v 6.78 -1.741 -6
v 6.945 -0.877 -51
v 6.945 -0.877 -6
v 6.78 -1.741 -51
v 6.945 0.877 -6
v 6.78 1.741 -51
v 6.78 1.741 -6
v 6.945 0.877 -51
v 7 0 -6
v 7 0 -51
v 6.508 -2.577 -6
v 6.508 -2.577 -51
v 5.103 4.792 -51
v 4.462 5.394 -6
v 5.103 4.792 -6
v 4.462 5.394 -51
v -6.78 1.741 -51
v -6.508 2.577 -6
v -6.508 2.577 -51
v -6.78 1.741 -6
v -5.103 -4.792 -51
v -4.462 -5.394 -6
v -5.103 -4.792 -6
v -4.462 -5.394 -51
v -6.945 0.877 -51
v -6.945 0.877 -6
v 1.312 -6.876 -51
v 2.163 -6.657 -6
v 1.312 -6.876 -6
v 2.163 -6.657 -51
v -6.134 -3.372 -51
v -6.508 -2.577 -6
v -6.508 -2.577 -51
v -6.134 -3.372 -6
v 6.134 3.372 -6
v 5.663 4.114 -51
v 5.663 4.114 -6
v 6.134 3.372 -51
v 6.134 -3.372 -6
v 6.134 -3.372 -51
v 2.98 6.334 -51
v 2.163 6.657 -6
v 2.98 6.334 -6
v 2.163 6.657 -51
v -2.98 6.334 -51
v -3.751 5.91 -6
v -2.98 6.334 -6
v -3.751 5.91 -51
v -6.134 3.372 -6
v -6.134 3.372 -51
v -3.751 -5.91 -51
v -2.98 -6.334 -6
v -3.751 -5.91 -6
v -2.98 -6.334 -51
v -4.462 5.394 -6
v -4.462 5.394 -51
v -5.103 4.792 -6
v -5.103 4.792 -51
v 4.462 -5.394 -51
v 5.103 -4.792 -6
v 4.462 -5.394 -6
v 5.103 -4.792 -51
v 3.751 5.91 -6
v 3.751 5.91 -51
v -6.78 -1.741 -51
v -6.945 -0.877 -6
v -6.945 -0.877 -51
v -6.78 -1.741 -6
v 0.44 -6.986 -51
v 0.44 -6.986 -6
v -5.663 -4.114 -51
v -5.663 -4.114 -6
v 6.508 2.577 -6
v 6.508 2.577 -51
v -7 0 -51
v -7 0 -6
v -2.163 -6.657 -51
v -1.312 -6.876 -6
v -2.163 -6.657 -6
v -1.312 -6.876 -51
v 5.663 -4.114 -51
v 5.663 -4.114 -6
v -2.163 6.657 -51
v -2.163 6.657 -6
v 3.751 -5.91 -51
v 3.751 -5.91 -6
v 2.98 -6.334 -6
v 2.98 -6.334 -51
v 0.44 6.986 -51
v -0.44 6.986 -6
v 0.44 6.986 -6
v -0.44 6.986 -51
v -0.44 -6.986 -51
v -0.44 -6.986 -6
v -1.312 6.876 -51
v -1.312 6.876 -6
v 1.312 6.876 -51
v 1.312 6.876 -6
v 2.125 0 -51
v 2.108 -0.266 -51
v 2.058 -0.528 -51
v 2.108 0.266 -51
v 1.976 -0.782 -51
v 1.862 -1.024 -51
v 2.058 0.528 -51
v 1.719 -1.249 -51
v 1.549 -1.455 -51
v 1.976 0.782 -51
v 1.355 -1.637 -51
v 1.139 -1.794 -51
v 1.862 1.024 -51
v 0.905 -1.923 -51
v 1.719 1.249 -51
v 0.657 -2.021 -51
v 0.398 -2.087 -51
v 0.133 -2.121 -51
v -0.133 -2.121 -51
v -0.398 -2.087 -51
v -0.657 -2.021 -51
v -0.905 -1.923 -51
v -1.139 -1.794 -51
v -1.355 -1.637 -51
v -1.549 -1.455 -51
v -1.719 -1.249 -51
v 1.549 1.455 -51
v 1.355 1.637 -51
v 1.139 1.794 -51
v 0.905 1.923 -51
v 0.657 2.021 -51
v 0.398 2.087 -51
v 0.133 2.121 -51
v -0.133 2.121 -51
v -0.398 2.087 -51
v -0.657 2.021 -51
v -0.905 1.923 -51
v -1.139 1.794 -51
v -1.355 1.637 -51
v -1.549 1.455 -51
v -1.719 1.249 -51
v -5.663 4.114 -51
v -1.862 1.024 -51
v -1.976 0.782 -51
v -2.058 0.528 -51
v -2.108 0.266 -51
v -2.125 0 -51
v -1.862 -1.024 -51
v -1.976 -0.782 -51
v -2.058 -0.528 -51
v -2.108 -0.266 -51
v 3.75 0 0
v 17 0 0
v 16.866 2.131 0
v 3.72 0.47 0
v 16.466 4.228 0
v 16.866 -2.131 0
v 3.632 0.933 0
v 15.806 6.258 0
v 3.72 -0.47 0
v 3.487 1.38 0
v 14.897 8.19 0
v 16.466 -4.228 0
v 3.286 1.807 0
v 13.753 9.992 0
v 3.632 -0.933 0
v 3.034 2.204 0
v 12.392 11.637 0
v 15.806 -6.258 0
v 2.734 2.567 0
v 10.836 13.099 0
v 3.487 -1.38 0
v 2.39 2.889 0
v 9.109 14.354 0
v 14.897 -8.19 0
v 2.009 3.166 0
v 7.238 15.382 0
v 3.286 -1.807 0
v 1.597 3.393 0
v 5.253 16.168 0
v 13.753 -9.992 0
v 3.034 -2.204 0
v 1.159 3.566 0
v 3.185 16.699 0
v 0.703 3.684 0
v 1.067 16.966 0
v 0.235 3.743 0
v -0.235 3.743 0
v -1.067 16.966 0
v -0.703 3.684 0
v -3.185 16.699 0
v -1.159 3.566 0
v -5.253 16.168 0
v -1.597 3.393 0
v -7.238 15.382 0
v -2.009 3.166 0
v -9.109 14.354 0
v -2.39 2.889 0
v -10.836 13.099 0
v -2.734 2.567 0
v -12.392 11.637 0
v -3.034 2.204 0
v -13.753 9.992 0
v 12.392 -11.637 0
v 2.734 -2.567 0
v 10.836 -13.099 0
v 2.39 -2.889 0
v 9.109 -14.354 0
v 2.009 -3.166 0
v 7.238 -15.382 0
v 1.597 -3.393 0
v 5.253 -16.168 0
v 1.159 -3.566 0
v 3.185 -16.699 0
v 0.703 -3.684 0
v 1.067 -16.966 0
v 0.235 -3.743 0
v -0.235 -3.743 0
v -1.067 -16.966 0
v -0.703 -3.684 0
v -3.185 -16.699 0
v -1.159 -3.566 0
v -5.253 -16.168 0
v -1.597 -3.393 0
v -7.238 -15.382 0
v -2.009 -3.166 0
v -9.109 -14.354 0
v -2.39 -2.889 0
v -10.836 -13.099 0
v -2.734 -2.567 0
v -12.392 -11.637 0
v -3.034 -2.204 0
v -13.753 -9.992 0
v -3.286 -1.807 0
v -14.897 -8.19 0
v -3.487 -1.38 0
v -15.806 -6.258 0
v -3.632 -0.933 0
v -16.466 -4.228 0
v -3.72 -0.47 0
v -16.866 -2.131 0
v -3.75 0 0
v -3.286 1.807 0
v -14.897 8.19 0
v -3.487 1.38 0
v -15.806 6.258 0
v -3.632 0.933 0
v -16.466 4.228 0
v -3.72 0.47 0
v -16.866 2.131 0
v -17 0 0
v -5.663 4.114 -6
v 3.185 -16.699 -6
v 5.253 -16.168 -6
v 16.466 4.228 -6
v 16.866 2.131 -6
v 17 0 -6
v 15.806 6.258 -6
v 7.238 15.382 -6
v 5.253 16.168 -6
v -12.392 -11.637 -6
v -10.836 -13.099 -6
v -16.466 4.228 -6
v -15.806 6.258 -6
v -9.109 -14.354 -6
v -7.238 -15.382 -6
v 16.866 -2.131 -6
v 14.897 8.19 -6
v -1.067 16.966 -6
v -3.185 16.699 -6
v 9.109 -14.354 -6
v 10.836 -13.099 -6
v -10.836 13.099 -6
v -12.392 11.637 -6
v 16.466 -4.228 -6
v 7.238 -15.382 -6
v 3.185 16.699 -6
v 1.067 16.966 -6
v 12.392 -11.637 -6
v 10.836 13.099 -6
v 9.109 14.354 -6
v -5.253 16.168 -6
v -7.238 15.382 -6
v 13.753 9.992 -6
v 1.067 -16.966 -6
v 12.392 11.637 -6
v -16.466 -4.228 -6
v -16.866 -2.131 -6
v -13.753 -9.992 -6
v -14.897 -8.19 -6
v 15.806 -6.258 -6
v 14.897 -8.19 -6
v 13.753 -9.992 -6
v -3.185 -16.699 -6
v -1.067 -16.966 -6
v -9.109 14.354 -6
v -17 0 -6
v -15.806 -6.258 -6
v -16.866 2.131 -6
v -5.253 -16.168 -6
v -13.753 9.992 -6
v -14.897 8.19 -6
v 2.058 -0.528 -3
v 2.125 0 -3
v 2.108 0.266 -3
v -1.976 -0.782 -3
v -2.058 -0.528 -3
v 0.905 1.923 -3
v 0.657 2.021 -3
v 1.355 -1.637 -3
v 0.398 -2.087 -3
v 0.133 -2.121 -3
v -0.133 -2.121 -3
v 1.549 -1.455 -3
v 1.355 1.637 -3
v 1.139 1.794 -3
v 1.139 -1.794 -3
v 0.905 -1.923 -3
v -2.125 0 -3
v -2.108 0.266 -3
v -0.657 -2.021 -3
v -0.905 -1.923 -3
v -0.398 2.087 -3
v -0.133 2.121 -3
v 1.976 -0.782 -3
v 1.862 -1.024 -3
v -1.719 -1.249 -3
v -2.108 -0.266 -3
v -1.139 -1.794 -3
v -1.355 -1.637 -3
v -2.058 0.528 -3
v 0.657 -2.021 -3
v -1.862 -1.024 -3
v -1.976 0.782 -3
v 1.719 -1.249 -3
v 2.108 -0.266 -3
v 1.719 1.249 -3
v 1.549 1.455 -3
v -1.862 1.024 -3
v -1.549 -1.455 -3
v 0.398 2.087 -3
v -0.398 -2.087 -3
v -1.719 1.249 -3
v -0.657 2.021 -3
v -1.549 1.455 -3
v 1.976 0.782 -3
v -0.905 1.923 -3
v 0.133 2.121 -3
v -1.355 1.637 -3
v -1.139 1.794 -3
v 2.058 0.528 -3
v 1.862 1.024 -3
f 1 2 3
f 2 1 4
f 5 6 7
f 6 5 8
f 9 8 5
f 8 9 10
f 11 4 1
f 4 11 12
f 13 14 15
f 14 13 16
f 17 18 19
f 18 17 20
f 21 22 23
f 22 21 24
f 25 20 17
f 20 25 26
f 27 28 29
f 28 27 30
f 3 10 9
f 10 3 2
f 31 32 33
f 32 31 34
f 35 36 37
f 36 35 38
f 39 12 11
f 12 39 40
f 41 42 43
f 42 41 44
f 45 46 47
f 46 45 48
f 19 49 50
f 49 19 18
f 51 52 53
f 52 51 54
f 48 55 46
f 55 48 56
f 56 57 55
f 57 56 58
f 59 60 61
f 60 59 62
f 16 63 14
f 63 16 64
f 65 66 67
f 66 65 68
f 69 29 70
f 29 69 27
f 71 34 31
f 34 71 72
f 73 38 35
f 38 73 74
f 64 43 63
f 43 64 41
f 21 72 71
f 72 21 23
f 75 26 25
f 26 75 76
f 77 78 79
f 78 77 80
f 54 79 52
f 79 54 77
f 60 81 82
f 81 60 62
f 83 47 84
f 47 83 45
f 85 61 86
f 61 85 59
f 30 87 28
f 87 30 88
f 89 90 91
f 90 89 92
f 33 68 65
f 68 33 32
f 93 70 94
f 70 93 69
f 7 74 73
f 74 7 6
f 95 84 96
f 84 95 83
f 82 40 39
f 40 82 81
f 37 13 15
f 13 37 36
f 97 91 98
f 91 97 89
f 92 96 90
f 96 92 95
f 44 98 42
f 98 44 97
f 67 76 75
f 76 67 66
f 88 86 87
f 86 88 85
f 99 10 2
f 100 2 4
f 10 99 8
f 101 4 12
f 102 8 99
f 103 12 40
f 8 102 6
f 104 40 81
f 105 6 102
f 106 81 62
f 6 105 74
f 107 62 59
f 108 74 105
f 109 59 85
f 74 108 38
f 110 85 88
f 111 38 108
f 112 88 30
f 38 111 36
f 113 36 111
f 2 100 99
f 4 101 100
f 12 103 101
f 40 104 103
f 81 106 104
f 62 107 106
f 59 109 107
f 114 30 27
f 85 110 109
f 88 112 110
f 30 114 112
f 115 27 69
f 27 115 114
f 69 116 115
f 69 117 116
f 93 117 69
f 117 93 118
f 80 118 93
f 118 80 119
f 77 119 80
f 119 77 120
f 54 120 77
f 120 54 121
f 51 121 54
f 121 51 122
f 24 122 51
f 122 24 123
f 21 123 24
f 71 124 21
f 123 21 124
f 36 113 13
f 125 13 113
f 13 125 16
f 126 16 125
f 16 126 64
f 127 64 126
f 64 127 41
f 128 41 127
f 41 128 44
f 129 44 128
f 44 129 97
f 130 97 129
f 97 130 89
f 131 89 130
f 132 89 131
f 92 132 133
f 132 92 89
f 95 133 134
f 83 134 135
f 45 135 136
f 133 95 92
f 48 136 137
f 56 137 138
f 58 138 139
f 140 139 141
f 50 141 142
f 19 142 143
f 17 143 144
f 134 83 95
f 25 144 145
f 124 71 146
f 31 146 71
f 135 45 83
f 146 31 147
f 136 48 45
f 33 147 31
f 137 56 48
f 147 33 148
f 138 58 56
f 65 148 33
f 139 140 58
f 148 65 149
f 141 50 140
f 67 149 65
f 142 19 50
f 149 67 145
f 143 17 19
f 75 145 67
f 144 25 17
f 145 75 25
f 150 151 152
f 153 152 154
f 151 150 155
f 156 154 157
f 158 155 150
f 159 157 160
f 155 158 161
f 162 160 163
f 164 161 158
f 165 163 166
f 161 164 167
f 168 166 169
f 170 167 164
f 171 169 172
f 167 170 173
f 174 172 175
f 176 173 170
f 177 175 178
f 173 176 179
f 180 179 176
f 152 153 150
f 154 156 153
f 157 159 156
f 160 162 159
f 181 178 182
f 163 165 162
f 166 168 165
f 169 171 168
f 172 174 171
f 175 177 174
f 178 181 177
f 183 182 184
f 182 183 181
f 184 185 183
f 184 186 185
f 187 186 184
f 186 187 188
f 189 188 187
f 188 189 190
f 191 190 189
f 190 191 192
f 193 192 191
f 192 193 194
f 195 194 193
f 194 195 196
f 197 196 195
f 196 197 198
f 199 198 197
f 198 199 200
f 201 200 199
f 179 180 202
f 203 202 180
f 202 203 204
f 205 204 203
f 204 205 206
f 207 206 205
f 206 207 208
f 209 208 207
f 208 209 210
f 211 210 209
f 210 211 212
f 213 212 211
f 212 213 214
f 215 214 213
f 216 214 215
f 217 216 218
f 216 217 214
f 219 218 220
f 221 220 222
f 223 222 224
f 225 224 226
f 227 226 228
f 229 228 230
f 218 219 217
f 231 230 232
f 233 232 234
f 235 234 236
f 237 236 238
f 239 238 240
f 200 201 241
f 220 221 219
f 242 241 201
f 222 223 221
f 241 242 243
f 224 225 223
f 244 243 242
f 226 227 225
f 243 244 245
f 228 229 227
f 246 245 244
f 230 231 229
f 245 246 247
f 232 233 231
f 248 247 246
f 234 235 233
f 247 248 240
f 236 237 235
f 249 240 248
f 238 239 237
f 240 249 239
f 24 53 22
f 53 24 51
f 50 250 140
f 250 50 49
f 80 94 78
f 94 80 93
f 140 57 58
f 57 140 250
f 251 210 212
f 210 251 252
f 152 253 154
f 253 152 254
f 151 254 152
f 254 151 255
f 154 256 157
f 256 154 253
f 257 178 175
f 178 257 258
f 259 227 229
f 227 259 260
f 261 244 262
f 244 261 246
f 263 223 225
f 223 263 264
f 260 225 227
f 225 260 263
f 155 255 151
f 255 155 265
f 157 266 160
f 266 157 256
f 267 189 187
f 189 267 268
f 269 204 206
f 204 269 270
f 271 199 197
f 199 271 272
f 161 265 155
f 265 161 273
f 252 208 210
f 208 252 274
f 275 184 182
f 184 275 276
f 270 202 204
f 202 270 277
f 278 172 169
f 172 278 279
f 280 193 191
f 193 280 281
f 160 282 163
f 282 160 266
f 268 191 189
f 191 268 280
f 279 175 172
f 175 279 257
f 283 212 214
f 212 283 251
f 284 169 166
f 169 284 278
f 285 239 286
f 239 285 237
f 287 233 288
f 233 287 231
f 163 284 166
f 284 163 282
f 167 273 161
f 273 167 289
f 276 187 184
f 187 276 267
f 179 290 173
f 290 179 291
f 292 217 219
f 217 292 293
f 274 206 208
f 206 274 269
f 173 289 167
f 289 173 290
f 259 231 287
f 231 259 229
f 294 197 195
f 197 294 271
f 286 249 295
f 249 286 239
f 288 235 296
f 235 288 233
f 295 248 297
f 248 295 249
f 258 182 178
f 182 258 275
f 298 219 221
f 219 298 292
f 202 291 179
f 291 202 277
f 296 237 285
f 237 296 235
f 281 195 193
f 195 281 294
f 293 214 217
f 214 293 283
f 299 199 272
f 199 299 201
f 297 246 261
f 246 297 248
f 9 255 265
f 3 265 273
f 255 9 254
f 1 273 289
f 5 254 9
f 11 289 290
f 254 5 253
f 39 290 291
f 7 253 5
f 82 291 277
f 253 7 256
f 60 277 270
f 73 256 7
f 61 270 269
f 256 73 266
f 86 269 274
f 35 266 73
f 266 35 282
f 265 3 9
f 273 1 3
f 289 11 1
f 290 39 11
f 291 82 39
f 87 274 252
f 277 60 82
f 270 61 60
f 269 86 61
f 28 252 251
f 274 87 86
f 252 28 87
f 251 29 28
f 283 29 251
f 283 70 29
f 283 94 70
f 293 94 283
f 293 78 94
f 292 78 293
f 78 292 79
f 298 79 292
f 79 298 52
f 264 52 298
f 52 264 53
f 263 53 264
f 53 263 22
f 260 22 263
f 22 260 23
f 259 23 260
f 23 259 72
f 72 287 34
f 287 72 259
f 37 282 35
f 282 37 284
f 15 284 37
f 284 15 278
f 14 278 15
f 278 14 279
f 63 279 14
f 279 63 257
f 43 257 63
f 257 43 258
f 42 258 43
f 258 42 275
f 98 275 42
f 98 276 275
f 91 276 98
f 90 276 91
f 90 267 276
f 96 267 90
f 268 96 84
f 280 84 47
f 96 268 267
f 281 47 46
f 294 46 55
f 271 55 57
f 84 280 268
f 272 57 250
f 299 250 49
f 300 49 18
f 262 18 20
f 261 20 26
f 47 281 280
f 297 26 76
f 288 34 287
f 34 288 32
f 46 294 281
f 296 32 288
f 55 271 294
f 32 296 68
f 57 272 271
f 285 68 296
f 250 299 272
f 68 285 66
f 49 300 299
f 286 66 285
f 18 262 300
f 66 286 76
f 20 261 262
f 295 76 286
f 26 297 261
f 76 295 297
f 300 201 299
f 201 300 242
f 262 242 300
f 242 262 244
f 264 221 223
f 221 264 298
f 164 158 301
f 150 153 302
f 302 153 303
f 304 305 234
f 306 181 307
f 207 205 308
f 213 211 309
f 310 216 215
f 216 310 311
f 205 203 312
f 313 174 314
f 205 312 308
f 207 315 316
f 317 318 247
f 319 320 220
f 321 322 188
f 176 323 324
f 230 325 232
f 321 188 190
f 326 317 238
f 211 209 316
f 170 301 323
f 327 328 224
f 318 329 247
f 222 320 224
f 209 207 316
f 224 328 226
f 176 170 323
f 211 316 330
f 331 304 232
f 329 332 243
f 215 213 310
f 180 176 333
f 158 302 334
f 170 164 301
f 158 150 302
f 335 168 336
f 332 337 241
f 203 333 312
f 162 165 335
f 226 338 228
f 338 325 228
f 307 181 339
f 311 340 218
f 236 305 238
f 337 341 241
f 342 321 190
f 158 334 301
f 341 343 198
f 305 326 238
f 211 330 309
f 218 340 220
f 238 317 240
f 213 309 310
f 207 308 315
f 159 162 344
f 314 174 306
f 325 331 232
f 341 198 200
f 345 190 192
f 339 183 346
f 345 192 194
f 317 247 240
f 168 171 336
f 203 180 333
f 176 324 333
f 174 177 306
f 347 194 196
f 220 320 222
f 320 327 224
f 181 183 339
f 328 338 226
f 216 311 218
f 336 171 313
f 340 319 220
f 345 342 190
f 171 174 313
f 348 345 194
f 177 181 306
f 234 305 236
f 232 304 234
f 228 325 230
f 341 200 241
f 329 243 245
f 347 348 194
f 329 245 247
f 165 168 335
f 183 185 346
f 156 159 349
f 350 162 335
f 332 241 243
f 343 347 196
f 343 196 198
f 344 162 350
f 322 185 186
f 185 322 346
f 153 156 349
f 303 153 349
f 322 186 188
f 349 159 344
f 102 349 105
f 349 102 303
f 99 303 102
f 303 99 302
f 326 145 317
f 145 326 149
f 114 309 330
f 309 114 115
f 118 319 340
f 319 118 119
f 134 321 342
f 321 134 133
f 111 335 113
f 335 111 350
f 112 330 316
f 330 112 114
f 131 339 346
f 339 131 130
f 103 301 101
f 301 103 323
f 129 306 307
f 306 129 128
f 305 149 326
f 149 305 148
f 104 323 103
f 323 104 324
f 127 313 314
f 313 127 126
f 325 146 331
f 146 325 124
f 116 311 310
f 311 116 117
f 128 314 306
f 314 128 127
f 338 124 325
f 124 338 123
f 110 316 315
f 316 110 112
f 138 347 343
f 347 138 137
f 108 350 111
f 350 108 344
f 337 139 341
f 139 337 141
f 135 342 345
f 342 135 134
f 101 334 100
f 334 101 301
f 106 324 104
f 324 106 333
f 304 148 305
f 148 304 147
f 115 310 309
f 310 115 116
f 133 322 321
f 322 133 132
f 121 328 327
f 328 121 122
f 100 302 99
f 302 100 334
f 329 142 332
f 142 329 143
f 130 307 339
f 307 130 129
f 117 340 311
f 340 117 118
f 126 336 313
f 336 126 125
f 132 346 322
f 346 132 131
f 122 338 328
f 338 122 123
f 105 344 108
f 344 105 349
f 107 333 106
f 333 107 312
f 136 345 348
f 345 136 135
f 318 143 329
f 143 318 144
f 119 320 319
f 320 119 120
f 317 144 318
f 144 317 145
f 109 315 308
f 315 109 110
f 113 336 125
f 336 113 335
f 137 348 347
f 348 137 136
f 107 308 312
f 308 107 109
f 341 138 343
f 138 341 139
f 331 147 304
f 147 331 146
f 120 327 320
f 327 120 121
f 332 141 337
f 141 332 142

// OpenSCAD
$fn = 50;


difference() {
	union() {
		translate(v = [0, 0, -51.0000000000]) {
			cylinder(h = 51, r = 7.0000000000);
		}
		translate(v = [0, 0, -6.0000000000]) {
			cylinder(h = 6, r = 17.0000000000);
		}
	}
	union() {
		translate(v = [0, 0, 0]) {
			rotate(a = [0, 0, 0]) {
				difference() {
					union() {
						#translate(v = [0, 0, -51.0000000000]) {
							cylinder(h = 51, r = 2.0000000000);
						}
						#translate(v = [0, 0, -3]) {
							cylinder(h = 3, r1 = 2.1250000000, r2 = 3.7500000000);
						}
						#translate(v = [0, 0, -51.0000000000]) {
							cylinder(h = 51, r = 2.1250000000);
						}
						#translate(v = [0, 0, -51.0000000000]) {
							cylinder(h = 51, r = 2.0000000000);
						}
					}
					union();
				}
			}
		}
	}
}
